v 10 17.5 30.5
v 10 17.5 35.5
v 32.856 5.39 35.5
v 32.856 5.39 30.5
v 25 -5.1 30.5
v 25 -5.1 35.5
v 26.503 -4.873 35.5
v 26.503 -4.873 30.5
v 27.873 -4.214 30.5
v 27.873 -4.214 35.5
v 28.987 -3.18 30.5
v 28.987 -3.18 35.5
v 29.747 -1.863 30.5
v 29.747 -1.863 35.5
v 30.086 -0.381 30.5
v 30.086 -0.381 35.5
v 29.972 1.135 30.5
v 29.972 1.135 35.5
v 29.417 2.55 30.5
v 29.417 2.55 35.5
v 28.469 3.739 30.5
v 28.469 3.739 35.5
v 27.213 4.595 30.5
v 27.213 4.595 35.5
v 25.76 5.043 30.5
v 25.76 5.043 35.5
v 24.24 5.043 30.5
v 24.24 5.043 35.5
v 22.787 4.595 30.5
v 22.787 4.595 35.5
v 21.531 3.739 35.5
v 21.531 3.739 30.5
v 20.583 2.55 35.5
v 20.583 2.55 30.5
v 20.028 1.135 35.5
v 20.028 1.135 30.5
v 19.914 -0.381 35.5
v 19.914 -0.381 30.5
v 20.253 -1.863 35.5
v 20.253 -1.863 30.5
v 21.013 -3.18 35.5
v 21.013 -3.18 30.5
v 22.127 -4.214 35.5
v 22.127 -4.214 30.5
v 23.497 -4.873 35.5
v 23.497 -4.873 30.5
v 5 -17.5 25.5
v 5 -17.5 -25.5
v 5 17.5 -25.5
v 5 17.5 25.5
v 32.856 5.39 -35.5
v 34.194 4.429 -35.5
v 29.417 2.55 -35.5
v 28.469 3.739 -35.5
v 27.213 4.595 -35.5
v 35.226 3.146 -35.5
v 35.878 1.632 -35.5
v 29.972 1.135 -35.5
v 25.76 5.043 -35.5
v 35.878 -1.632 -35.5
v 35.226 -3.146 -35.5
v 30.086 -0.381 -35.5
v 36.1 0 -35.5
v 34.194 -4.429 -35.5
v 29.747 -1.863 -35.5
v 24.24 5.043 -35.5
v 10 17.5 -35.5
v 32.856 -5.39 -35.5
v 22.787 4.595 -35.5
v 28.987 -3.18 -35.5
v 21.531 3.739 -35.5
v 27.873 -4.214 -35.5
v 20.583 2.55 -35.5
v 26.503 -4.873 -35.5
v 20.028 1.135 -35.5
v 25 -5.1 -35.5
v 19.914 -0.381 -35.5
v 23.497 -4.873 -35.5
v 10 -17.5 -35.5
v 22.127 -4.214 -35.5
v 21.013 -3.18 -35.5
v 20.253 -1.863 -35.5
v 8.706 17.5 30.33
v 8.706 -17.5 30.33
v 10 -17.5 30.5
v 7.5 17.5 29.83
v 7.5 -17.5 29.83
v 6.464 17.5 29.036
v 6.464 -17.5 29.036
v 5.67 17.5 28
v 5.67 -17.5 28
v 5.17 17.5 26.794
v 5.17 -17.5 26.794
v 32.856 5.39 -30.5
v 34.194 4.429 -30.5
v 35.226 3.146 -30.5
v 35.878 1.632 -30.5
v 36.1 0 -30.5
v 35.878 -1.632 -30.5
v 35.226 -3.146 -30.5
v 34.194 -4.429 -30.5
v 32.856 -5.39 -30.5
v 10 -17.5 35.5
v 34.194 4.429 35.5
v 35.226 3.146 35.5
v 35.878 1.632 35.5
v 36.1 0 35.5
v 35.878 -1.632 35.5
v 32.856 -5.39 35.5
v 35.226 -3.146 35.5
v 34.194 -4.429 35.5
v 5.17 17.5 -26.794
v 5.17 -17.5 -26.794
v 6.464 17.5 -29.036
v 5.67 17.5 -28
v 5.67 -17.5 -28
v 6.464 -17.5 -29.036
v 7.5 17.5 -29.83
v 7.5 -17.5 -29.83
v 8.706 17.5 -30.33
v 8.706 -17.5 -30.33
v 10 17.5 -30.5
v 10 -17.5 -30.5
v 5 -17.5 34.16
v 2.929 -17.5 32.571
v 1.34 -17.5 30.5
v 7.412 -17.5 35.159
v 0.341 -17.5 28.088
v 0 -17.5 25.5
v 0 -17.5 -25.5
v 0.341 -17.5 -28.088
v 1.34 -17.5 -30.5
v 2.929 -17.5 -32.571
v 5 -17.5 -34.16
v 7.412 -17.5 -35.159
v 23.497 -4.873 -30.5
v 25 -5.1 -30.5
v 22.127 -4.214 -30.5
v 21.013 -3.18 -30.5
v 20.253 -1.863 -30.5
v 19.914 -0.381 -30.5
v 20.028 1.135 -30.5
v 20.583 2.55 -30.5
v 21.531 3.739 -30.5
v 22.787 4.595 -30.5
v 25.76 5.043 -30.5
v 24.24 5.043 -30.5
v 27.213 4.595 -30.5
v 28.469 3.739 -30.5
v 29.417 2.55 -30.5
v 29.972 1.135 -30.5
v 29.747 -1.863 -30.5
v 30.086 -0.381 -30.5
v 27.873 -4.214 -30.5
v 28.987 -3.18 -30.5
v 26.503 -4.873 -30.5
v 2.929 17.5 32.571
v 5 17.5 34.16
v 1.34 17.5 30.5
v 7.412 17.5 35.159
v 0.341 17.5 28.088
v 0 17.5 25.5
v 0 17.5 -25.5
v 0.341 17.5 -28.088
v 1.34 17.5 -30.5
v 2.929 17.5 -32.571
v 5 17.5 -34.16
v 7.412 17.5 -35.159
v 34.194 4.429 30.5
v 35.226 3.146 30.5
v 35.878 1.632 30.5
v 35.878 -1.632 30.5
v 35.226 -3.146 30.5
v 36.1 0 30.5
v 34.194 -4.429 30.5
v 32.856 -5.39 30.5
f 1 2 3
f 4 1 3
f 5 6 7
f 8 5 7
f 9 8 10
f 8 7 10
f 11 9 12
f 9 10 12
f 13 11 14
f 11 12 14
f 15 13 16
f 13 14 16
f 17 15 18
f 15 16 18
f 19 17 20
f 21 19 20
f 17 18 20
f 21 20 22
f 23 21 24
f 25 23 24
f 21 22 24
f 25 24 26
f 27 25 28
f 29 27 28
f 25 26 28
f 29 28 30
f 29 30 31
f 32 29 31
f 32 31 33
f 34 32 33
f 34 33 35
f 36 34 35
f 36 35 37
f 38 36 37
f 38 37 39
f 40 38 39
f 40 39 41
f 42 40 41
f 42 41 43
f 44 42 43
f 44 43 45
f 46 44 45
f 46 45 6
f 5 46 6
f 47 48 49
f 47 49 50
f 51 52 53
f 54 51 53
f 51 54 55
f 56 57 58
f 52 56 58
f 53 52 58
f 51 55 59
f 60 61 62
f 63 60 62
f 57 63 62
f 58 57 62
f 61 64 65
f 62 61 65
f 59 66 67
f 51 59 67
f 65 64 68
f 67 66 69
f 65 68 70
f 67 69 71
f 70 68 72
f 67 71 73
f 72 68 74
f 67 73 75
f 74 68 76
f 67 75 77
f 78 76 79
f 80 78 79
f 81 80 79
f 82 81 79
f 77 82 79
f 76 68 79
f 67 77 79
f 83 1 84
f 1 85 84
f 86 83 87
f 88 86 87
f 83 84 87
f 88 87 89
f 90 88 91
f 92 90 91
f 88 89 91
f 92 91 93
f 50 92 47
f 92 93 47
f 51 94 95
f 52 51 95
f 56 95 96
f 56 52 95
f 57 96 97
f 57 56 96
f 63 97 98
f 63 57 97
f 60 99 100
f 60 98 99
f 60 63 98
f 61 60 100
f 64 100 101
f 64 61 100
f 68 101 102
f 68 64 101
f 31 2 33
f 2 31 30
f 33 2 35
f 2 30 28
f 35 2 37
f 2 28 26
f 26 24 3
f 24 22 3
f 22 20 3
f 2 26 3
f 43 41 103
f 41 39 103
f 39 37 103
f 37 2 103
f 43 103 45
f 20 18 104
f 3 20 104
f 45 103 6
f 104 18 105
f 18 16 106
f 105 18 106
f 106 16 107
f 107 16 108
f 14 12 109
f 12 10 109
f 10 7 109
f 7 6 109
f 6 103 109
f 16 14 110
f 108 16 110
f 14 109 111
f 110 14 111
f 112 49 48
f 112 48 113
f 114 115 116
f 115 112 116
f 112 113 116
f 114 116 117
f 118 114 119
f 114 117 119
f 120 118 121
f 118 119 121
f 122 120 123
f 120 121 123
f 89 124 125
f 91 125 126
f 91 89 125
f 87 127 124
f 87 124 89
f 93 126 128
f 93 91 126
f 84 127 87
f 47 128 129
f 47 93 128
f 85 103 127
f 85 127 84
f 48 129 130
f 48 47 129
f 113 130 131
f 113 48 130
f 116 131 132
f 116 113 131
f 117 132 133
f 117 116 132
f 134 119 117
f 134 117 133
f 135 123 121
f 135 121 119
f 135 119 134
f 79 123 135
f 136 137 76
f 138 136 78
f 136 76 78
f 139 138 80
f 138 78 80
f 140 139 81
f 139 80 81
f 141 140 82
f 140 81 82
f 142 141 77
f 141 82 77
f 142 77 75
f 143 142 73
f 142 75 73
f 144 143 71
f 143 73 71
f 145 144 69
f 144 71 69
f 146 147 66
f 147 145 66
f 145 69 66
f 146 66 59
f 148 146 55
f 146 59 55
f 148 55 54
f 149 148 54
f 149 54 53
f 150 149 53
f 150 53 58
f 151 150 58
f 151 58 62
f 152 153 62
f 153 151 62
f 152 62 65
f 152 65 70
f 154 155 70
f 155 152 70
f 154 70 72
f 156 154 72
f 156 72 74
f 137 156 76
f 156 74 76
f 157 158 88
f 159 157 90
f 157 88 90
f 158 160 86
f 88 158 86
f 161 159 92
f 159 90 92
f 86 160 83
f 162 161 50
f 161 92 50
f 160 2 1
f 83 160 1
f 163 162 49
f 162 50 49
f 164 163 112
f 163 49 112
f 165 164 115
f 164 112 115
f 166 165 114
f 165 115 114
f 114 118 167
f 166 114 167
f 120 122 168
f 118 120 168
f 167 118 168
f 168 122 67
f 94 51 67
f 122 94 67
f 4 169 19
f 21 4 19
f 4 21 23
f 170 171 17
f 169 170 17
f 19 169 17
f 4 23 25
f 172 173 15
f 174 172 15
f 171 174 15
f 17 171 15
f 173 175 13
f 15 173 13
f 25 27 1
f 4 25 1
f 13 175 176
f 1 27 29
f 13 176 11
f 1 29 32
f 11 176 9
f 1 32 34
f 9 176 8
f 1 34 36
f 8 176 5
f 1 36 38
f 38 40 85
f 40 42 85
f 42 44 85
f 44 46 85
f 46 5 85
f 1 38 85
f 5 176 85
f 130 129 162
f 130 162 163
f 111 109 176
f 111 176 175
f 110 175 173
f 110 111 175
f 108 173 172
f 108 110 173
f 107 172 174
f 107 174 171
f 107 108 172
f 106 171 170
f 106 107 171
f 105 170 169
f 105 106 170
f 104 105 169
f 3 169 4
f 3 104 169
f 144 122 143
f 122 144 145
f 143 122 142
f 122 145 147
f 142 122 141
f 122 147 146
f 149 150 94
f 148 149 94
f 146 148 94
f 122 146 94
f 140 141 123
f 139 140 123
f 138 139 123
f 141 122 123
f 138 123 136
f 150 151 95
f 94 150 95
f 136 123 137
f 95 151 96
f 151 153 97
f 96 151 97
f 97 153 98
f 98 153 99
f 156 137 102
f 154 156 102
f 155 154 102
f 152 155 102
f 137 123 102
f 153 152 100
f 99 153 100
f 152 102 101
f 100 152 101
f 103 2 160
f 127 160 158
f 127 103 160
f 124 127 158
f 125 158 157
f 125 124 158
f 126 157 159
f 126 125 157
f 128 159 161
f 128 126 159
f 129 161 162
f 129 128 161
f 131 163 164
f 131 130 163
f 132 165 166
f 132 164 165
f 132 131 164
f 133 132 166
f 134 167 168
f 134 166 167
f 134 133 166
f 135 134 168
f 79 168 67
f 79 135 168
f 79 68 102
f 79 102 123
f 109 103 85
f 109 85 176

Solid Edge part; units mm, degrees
sketch "Sketch1" plane through (0, 0, 0) normal (0, 1, 0) x (-1, 0, 0)
  line L0 (0, 25.5) -> (0, 0)
  line L1 (0, 0) -> (-5, 0)
  line L2 (-5, 0) -> (-5, 25.5)
  arc A0 (-10, 30.5) -> (-5, 25.5) centre (-10, 25.5) cw
  line L3 (-50, 30.5) -> (-10, 30.5)
  line L4 (-50, 35.5) -> (-50, 30.5)
  line L5 (-10, 35.5) -> (-50, 35.5)
  arc A1 (-10, 35.5) -> (0, 25.5) centre (-10, 25.5) cw
  dimension "D1" = 10
extrude "Protrusion1" add sketch "Sketch1" along normal mid plane 35
hole "Hole_1" at (25, 0, 35.5) direction (0, 0, -1) diameter 10.2 end up to next
sketch "Sketch2" plane through (40, 0, 35.5) normal (0, 0, 1) x (0, 1, 0)
  line L0 (-17.5, 30) -> (-5.3902, 7.1441)
  arc A0 (-5.3902, 7.1441) -> (5.3902, 7.1441) centre (0, 10) ccw
  line L1 (17.5, 30) -> (5.3902, 7.1441)
extrude "Cutout1" cut sketch "Sketch2" against normal up to next material side at (21.4514, -11.4893, 35.5)
mirror "Mirror1" about plane through (5, 0, 0) normal (0, 0, -1) of "Protrusion1", "Cutout1", "Hole_1"
